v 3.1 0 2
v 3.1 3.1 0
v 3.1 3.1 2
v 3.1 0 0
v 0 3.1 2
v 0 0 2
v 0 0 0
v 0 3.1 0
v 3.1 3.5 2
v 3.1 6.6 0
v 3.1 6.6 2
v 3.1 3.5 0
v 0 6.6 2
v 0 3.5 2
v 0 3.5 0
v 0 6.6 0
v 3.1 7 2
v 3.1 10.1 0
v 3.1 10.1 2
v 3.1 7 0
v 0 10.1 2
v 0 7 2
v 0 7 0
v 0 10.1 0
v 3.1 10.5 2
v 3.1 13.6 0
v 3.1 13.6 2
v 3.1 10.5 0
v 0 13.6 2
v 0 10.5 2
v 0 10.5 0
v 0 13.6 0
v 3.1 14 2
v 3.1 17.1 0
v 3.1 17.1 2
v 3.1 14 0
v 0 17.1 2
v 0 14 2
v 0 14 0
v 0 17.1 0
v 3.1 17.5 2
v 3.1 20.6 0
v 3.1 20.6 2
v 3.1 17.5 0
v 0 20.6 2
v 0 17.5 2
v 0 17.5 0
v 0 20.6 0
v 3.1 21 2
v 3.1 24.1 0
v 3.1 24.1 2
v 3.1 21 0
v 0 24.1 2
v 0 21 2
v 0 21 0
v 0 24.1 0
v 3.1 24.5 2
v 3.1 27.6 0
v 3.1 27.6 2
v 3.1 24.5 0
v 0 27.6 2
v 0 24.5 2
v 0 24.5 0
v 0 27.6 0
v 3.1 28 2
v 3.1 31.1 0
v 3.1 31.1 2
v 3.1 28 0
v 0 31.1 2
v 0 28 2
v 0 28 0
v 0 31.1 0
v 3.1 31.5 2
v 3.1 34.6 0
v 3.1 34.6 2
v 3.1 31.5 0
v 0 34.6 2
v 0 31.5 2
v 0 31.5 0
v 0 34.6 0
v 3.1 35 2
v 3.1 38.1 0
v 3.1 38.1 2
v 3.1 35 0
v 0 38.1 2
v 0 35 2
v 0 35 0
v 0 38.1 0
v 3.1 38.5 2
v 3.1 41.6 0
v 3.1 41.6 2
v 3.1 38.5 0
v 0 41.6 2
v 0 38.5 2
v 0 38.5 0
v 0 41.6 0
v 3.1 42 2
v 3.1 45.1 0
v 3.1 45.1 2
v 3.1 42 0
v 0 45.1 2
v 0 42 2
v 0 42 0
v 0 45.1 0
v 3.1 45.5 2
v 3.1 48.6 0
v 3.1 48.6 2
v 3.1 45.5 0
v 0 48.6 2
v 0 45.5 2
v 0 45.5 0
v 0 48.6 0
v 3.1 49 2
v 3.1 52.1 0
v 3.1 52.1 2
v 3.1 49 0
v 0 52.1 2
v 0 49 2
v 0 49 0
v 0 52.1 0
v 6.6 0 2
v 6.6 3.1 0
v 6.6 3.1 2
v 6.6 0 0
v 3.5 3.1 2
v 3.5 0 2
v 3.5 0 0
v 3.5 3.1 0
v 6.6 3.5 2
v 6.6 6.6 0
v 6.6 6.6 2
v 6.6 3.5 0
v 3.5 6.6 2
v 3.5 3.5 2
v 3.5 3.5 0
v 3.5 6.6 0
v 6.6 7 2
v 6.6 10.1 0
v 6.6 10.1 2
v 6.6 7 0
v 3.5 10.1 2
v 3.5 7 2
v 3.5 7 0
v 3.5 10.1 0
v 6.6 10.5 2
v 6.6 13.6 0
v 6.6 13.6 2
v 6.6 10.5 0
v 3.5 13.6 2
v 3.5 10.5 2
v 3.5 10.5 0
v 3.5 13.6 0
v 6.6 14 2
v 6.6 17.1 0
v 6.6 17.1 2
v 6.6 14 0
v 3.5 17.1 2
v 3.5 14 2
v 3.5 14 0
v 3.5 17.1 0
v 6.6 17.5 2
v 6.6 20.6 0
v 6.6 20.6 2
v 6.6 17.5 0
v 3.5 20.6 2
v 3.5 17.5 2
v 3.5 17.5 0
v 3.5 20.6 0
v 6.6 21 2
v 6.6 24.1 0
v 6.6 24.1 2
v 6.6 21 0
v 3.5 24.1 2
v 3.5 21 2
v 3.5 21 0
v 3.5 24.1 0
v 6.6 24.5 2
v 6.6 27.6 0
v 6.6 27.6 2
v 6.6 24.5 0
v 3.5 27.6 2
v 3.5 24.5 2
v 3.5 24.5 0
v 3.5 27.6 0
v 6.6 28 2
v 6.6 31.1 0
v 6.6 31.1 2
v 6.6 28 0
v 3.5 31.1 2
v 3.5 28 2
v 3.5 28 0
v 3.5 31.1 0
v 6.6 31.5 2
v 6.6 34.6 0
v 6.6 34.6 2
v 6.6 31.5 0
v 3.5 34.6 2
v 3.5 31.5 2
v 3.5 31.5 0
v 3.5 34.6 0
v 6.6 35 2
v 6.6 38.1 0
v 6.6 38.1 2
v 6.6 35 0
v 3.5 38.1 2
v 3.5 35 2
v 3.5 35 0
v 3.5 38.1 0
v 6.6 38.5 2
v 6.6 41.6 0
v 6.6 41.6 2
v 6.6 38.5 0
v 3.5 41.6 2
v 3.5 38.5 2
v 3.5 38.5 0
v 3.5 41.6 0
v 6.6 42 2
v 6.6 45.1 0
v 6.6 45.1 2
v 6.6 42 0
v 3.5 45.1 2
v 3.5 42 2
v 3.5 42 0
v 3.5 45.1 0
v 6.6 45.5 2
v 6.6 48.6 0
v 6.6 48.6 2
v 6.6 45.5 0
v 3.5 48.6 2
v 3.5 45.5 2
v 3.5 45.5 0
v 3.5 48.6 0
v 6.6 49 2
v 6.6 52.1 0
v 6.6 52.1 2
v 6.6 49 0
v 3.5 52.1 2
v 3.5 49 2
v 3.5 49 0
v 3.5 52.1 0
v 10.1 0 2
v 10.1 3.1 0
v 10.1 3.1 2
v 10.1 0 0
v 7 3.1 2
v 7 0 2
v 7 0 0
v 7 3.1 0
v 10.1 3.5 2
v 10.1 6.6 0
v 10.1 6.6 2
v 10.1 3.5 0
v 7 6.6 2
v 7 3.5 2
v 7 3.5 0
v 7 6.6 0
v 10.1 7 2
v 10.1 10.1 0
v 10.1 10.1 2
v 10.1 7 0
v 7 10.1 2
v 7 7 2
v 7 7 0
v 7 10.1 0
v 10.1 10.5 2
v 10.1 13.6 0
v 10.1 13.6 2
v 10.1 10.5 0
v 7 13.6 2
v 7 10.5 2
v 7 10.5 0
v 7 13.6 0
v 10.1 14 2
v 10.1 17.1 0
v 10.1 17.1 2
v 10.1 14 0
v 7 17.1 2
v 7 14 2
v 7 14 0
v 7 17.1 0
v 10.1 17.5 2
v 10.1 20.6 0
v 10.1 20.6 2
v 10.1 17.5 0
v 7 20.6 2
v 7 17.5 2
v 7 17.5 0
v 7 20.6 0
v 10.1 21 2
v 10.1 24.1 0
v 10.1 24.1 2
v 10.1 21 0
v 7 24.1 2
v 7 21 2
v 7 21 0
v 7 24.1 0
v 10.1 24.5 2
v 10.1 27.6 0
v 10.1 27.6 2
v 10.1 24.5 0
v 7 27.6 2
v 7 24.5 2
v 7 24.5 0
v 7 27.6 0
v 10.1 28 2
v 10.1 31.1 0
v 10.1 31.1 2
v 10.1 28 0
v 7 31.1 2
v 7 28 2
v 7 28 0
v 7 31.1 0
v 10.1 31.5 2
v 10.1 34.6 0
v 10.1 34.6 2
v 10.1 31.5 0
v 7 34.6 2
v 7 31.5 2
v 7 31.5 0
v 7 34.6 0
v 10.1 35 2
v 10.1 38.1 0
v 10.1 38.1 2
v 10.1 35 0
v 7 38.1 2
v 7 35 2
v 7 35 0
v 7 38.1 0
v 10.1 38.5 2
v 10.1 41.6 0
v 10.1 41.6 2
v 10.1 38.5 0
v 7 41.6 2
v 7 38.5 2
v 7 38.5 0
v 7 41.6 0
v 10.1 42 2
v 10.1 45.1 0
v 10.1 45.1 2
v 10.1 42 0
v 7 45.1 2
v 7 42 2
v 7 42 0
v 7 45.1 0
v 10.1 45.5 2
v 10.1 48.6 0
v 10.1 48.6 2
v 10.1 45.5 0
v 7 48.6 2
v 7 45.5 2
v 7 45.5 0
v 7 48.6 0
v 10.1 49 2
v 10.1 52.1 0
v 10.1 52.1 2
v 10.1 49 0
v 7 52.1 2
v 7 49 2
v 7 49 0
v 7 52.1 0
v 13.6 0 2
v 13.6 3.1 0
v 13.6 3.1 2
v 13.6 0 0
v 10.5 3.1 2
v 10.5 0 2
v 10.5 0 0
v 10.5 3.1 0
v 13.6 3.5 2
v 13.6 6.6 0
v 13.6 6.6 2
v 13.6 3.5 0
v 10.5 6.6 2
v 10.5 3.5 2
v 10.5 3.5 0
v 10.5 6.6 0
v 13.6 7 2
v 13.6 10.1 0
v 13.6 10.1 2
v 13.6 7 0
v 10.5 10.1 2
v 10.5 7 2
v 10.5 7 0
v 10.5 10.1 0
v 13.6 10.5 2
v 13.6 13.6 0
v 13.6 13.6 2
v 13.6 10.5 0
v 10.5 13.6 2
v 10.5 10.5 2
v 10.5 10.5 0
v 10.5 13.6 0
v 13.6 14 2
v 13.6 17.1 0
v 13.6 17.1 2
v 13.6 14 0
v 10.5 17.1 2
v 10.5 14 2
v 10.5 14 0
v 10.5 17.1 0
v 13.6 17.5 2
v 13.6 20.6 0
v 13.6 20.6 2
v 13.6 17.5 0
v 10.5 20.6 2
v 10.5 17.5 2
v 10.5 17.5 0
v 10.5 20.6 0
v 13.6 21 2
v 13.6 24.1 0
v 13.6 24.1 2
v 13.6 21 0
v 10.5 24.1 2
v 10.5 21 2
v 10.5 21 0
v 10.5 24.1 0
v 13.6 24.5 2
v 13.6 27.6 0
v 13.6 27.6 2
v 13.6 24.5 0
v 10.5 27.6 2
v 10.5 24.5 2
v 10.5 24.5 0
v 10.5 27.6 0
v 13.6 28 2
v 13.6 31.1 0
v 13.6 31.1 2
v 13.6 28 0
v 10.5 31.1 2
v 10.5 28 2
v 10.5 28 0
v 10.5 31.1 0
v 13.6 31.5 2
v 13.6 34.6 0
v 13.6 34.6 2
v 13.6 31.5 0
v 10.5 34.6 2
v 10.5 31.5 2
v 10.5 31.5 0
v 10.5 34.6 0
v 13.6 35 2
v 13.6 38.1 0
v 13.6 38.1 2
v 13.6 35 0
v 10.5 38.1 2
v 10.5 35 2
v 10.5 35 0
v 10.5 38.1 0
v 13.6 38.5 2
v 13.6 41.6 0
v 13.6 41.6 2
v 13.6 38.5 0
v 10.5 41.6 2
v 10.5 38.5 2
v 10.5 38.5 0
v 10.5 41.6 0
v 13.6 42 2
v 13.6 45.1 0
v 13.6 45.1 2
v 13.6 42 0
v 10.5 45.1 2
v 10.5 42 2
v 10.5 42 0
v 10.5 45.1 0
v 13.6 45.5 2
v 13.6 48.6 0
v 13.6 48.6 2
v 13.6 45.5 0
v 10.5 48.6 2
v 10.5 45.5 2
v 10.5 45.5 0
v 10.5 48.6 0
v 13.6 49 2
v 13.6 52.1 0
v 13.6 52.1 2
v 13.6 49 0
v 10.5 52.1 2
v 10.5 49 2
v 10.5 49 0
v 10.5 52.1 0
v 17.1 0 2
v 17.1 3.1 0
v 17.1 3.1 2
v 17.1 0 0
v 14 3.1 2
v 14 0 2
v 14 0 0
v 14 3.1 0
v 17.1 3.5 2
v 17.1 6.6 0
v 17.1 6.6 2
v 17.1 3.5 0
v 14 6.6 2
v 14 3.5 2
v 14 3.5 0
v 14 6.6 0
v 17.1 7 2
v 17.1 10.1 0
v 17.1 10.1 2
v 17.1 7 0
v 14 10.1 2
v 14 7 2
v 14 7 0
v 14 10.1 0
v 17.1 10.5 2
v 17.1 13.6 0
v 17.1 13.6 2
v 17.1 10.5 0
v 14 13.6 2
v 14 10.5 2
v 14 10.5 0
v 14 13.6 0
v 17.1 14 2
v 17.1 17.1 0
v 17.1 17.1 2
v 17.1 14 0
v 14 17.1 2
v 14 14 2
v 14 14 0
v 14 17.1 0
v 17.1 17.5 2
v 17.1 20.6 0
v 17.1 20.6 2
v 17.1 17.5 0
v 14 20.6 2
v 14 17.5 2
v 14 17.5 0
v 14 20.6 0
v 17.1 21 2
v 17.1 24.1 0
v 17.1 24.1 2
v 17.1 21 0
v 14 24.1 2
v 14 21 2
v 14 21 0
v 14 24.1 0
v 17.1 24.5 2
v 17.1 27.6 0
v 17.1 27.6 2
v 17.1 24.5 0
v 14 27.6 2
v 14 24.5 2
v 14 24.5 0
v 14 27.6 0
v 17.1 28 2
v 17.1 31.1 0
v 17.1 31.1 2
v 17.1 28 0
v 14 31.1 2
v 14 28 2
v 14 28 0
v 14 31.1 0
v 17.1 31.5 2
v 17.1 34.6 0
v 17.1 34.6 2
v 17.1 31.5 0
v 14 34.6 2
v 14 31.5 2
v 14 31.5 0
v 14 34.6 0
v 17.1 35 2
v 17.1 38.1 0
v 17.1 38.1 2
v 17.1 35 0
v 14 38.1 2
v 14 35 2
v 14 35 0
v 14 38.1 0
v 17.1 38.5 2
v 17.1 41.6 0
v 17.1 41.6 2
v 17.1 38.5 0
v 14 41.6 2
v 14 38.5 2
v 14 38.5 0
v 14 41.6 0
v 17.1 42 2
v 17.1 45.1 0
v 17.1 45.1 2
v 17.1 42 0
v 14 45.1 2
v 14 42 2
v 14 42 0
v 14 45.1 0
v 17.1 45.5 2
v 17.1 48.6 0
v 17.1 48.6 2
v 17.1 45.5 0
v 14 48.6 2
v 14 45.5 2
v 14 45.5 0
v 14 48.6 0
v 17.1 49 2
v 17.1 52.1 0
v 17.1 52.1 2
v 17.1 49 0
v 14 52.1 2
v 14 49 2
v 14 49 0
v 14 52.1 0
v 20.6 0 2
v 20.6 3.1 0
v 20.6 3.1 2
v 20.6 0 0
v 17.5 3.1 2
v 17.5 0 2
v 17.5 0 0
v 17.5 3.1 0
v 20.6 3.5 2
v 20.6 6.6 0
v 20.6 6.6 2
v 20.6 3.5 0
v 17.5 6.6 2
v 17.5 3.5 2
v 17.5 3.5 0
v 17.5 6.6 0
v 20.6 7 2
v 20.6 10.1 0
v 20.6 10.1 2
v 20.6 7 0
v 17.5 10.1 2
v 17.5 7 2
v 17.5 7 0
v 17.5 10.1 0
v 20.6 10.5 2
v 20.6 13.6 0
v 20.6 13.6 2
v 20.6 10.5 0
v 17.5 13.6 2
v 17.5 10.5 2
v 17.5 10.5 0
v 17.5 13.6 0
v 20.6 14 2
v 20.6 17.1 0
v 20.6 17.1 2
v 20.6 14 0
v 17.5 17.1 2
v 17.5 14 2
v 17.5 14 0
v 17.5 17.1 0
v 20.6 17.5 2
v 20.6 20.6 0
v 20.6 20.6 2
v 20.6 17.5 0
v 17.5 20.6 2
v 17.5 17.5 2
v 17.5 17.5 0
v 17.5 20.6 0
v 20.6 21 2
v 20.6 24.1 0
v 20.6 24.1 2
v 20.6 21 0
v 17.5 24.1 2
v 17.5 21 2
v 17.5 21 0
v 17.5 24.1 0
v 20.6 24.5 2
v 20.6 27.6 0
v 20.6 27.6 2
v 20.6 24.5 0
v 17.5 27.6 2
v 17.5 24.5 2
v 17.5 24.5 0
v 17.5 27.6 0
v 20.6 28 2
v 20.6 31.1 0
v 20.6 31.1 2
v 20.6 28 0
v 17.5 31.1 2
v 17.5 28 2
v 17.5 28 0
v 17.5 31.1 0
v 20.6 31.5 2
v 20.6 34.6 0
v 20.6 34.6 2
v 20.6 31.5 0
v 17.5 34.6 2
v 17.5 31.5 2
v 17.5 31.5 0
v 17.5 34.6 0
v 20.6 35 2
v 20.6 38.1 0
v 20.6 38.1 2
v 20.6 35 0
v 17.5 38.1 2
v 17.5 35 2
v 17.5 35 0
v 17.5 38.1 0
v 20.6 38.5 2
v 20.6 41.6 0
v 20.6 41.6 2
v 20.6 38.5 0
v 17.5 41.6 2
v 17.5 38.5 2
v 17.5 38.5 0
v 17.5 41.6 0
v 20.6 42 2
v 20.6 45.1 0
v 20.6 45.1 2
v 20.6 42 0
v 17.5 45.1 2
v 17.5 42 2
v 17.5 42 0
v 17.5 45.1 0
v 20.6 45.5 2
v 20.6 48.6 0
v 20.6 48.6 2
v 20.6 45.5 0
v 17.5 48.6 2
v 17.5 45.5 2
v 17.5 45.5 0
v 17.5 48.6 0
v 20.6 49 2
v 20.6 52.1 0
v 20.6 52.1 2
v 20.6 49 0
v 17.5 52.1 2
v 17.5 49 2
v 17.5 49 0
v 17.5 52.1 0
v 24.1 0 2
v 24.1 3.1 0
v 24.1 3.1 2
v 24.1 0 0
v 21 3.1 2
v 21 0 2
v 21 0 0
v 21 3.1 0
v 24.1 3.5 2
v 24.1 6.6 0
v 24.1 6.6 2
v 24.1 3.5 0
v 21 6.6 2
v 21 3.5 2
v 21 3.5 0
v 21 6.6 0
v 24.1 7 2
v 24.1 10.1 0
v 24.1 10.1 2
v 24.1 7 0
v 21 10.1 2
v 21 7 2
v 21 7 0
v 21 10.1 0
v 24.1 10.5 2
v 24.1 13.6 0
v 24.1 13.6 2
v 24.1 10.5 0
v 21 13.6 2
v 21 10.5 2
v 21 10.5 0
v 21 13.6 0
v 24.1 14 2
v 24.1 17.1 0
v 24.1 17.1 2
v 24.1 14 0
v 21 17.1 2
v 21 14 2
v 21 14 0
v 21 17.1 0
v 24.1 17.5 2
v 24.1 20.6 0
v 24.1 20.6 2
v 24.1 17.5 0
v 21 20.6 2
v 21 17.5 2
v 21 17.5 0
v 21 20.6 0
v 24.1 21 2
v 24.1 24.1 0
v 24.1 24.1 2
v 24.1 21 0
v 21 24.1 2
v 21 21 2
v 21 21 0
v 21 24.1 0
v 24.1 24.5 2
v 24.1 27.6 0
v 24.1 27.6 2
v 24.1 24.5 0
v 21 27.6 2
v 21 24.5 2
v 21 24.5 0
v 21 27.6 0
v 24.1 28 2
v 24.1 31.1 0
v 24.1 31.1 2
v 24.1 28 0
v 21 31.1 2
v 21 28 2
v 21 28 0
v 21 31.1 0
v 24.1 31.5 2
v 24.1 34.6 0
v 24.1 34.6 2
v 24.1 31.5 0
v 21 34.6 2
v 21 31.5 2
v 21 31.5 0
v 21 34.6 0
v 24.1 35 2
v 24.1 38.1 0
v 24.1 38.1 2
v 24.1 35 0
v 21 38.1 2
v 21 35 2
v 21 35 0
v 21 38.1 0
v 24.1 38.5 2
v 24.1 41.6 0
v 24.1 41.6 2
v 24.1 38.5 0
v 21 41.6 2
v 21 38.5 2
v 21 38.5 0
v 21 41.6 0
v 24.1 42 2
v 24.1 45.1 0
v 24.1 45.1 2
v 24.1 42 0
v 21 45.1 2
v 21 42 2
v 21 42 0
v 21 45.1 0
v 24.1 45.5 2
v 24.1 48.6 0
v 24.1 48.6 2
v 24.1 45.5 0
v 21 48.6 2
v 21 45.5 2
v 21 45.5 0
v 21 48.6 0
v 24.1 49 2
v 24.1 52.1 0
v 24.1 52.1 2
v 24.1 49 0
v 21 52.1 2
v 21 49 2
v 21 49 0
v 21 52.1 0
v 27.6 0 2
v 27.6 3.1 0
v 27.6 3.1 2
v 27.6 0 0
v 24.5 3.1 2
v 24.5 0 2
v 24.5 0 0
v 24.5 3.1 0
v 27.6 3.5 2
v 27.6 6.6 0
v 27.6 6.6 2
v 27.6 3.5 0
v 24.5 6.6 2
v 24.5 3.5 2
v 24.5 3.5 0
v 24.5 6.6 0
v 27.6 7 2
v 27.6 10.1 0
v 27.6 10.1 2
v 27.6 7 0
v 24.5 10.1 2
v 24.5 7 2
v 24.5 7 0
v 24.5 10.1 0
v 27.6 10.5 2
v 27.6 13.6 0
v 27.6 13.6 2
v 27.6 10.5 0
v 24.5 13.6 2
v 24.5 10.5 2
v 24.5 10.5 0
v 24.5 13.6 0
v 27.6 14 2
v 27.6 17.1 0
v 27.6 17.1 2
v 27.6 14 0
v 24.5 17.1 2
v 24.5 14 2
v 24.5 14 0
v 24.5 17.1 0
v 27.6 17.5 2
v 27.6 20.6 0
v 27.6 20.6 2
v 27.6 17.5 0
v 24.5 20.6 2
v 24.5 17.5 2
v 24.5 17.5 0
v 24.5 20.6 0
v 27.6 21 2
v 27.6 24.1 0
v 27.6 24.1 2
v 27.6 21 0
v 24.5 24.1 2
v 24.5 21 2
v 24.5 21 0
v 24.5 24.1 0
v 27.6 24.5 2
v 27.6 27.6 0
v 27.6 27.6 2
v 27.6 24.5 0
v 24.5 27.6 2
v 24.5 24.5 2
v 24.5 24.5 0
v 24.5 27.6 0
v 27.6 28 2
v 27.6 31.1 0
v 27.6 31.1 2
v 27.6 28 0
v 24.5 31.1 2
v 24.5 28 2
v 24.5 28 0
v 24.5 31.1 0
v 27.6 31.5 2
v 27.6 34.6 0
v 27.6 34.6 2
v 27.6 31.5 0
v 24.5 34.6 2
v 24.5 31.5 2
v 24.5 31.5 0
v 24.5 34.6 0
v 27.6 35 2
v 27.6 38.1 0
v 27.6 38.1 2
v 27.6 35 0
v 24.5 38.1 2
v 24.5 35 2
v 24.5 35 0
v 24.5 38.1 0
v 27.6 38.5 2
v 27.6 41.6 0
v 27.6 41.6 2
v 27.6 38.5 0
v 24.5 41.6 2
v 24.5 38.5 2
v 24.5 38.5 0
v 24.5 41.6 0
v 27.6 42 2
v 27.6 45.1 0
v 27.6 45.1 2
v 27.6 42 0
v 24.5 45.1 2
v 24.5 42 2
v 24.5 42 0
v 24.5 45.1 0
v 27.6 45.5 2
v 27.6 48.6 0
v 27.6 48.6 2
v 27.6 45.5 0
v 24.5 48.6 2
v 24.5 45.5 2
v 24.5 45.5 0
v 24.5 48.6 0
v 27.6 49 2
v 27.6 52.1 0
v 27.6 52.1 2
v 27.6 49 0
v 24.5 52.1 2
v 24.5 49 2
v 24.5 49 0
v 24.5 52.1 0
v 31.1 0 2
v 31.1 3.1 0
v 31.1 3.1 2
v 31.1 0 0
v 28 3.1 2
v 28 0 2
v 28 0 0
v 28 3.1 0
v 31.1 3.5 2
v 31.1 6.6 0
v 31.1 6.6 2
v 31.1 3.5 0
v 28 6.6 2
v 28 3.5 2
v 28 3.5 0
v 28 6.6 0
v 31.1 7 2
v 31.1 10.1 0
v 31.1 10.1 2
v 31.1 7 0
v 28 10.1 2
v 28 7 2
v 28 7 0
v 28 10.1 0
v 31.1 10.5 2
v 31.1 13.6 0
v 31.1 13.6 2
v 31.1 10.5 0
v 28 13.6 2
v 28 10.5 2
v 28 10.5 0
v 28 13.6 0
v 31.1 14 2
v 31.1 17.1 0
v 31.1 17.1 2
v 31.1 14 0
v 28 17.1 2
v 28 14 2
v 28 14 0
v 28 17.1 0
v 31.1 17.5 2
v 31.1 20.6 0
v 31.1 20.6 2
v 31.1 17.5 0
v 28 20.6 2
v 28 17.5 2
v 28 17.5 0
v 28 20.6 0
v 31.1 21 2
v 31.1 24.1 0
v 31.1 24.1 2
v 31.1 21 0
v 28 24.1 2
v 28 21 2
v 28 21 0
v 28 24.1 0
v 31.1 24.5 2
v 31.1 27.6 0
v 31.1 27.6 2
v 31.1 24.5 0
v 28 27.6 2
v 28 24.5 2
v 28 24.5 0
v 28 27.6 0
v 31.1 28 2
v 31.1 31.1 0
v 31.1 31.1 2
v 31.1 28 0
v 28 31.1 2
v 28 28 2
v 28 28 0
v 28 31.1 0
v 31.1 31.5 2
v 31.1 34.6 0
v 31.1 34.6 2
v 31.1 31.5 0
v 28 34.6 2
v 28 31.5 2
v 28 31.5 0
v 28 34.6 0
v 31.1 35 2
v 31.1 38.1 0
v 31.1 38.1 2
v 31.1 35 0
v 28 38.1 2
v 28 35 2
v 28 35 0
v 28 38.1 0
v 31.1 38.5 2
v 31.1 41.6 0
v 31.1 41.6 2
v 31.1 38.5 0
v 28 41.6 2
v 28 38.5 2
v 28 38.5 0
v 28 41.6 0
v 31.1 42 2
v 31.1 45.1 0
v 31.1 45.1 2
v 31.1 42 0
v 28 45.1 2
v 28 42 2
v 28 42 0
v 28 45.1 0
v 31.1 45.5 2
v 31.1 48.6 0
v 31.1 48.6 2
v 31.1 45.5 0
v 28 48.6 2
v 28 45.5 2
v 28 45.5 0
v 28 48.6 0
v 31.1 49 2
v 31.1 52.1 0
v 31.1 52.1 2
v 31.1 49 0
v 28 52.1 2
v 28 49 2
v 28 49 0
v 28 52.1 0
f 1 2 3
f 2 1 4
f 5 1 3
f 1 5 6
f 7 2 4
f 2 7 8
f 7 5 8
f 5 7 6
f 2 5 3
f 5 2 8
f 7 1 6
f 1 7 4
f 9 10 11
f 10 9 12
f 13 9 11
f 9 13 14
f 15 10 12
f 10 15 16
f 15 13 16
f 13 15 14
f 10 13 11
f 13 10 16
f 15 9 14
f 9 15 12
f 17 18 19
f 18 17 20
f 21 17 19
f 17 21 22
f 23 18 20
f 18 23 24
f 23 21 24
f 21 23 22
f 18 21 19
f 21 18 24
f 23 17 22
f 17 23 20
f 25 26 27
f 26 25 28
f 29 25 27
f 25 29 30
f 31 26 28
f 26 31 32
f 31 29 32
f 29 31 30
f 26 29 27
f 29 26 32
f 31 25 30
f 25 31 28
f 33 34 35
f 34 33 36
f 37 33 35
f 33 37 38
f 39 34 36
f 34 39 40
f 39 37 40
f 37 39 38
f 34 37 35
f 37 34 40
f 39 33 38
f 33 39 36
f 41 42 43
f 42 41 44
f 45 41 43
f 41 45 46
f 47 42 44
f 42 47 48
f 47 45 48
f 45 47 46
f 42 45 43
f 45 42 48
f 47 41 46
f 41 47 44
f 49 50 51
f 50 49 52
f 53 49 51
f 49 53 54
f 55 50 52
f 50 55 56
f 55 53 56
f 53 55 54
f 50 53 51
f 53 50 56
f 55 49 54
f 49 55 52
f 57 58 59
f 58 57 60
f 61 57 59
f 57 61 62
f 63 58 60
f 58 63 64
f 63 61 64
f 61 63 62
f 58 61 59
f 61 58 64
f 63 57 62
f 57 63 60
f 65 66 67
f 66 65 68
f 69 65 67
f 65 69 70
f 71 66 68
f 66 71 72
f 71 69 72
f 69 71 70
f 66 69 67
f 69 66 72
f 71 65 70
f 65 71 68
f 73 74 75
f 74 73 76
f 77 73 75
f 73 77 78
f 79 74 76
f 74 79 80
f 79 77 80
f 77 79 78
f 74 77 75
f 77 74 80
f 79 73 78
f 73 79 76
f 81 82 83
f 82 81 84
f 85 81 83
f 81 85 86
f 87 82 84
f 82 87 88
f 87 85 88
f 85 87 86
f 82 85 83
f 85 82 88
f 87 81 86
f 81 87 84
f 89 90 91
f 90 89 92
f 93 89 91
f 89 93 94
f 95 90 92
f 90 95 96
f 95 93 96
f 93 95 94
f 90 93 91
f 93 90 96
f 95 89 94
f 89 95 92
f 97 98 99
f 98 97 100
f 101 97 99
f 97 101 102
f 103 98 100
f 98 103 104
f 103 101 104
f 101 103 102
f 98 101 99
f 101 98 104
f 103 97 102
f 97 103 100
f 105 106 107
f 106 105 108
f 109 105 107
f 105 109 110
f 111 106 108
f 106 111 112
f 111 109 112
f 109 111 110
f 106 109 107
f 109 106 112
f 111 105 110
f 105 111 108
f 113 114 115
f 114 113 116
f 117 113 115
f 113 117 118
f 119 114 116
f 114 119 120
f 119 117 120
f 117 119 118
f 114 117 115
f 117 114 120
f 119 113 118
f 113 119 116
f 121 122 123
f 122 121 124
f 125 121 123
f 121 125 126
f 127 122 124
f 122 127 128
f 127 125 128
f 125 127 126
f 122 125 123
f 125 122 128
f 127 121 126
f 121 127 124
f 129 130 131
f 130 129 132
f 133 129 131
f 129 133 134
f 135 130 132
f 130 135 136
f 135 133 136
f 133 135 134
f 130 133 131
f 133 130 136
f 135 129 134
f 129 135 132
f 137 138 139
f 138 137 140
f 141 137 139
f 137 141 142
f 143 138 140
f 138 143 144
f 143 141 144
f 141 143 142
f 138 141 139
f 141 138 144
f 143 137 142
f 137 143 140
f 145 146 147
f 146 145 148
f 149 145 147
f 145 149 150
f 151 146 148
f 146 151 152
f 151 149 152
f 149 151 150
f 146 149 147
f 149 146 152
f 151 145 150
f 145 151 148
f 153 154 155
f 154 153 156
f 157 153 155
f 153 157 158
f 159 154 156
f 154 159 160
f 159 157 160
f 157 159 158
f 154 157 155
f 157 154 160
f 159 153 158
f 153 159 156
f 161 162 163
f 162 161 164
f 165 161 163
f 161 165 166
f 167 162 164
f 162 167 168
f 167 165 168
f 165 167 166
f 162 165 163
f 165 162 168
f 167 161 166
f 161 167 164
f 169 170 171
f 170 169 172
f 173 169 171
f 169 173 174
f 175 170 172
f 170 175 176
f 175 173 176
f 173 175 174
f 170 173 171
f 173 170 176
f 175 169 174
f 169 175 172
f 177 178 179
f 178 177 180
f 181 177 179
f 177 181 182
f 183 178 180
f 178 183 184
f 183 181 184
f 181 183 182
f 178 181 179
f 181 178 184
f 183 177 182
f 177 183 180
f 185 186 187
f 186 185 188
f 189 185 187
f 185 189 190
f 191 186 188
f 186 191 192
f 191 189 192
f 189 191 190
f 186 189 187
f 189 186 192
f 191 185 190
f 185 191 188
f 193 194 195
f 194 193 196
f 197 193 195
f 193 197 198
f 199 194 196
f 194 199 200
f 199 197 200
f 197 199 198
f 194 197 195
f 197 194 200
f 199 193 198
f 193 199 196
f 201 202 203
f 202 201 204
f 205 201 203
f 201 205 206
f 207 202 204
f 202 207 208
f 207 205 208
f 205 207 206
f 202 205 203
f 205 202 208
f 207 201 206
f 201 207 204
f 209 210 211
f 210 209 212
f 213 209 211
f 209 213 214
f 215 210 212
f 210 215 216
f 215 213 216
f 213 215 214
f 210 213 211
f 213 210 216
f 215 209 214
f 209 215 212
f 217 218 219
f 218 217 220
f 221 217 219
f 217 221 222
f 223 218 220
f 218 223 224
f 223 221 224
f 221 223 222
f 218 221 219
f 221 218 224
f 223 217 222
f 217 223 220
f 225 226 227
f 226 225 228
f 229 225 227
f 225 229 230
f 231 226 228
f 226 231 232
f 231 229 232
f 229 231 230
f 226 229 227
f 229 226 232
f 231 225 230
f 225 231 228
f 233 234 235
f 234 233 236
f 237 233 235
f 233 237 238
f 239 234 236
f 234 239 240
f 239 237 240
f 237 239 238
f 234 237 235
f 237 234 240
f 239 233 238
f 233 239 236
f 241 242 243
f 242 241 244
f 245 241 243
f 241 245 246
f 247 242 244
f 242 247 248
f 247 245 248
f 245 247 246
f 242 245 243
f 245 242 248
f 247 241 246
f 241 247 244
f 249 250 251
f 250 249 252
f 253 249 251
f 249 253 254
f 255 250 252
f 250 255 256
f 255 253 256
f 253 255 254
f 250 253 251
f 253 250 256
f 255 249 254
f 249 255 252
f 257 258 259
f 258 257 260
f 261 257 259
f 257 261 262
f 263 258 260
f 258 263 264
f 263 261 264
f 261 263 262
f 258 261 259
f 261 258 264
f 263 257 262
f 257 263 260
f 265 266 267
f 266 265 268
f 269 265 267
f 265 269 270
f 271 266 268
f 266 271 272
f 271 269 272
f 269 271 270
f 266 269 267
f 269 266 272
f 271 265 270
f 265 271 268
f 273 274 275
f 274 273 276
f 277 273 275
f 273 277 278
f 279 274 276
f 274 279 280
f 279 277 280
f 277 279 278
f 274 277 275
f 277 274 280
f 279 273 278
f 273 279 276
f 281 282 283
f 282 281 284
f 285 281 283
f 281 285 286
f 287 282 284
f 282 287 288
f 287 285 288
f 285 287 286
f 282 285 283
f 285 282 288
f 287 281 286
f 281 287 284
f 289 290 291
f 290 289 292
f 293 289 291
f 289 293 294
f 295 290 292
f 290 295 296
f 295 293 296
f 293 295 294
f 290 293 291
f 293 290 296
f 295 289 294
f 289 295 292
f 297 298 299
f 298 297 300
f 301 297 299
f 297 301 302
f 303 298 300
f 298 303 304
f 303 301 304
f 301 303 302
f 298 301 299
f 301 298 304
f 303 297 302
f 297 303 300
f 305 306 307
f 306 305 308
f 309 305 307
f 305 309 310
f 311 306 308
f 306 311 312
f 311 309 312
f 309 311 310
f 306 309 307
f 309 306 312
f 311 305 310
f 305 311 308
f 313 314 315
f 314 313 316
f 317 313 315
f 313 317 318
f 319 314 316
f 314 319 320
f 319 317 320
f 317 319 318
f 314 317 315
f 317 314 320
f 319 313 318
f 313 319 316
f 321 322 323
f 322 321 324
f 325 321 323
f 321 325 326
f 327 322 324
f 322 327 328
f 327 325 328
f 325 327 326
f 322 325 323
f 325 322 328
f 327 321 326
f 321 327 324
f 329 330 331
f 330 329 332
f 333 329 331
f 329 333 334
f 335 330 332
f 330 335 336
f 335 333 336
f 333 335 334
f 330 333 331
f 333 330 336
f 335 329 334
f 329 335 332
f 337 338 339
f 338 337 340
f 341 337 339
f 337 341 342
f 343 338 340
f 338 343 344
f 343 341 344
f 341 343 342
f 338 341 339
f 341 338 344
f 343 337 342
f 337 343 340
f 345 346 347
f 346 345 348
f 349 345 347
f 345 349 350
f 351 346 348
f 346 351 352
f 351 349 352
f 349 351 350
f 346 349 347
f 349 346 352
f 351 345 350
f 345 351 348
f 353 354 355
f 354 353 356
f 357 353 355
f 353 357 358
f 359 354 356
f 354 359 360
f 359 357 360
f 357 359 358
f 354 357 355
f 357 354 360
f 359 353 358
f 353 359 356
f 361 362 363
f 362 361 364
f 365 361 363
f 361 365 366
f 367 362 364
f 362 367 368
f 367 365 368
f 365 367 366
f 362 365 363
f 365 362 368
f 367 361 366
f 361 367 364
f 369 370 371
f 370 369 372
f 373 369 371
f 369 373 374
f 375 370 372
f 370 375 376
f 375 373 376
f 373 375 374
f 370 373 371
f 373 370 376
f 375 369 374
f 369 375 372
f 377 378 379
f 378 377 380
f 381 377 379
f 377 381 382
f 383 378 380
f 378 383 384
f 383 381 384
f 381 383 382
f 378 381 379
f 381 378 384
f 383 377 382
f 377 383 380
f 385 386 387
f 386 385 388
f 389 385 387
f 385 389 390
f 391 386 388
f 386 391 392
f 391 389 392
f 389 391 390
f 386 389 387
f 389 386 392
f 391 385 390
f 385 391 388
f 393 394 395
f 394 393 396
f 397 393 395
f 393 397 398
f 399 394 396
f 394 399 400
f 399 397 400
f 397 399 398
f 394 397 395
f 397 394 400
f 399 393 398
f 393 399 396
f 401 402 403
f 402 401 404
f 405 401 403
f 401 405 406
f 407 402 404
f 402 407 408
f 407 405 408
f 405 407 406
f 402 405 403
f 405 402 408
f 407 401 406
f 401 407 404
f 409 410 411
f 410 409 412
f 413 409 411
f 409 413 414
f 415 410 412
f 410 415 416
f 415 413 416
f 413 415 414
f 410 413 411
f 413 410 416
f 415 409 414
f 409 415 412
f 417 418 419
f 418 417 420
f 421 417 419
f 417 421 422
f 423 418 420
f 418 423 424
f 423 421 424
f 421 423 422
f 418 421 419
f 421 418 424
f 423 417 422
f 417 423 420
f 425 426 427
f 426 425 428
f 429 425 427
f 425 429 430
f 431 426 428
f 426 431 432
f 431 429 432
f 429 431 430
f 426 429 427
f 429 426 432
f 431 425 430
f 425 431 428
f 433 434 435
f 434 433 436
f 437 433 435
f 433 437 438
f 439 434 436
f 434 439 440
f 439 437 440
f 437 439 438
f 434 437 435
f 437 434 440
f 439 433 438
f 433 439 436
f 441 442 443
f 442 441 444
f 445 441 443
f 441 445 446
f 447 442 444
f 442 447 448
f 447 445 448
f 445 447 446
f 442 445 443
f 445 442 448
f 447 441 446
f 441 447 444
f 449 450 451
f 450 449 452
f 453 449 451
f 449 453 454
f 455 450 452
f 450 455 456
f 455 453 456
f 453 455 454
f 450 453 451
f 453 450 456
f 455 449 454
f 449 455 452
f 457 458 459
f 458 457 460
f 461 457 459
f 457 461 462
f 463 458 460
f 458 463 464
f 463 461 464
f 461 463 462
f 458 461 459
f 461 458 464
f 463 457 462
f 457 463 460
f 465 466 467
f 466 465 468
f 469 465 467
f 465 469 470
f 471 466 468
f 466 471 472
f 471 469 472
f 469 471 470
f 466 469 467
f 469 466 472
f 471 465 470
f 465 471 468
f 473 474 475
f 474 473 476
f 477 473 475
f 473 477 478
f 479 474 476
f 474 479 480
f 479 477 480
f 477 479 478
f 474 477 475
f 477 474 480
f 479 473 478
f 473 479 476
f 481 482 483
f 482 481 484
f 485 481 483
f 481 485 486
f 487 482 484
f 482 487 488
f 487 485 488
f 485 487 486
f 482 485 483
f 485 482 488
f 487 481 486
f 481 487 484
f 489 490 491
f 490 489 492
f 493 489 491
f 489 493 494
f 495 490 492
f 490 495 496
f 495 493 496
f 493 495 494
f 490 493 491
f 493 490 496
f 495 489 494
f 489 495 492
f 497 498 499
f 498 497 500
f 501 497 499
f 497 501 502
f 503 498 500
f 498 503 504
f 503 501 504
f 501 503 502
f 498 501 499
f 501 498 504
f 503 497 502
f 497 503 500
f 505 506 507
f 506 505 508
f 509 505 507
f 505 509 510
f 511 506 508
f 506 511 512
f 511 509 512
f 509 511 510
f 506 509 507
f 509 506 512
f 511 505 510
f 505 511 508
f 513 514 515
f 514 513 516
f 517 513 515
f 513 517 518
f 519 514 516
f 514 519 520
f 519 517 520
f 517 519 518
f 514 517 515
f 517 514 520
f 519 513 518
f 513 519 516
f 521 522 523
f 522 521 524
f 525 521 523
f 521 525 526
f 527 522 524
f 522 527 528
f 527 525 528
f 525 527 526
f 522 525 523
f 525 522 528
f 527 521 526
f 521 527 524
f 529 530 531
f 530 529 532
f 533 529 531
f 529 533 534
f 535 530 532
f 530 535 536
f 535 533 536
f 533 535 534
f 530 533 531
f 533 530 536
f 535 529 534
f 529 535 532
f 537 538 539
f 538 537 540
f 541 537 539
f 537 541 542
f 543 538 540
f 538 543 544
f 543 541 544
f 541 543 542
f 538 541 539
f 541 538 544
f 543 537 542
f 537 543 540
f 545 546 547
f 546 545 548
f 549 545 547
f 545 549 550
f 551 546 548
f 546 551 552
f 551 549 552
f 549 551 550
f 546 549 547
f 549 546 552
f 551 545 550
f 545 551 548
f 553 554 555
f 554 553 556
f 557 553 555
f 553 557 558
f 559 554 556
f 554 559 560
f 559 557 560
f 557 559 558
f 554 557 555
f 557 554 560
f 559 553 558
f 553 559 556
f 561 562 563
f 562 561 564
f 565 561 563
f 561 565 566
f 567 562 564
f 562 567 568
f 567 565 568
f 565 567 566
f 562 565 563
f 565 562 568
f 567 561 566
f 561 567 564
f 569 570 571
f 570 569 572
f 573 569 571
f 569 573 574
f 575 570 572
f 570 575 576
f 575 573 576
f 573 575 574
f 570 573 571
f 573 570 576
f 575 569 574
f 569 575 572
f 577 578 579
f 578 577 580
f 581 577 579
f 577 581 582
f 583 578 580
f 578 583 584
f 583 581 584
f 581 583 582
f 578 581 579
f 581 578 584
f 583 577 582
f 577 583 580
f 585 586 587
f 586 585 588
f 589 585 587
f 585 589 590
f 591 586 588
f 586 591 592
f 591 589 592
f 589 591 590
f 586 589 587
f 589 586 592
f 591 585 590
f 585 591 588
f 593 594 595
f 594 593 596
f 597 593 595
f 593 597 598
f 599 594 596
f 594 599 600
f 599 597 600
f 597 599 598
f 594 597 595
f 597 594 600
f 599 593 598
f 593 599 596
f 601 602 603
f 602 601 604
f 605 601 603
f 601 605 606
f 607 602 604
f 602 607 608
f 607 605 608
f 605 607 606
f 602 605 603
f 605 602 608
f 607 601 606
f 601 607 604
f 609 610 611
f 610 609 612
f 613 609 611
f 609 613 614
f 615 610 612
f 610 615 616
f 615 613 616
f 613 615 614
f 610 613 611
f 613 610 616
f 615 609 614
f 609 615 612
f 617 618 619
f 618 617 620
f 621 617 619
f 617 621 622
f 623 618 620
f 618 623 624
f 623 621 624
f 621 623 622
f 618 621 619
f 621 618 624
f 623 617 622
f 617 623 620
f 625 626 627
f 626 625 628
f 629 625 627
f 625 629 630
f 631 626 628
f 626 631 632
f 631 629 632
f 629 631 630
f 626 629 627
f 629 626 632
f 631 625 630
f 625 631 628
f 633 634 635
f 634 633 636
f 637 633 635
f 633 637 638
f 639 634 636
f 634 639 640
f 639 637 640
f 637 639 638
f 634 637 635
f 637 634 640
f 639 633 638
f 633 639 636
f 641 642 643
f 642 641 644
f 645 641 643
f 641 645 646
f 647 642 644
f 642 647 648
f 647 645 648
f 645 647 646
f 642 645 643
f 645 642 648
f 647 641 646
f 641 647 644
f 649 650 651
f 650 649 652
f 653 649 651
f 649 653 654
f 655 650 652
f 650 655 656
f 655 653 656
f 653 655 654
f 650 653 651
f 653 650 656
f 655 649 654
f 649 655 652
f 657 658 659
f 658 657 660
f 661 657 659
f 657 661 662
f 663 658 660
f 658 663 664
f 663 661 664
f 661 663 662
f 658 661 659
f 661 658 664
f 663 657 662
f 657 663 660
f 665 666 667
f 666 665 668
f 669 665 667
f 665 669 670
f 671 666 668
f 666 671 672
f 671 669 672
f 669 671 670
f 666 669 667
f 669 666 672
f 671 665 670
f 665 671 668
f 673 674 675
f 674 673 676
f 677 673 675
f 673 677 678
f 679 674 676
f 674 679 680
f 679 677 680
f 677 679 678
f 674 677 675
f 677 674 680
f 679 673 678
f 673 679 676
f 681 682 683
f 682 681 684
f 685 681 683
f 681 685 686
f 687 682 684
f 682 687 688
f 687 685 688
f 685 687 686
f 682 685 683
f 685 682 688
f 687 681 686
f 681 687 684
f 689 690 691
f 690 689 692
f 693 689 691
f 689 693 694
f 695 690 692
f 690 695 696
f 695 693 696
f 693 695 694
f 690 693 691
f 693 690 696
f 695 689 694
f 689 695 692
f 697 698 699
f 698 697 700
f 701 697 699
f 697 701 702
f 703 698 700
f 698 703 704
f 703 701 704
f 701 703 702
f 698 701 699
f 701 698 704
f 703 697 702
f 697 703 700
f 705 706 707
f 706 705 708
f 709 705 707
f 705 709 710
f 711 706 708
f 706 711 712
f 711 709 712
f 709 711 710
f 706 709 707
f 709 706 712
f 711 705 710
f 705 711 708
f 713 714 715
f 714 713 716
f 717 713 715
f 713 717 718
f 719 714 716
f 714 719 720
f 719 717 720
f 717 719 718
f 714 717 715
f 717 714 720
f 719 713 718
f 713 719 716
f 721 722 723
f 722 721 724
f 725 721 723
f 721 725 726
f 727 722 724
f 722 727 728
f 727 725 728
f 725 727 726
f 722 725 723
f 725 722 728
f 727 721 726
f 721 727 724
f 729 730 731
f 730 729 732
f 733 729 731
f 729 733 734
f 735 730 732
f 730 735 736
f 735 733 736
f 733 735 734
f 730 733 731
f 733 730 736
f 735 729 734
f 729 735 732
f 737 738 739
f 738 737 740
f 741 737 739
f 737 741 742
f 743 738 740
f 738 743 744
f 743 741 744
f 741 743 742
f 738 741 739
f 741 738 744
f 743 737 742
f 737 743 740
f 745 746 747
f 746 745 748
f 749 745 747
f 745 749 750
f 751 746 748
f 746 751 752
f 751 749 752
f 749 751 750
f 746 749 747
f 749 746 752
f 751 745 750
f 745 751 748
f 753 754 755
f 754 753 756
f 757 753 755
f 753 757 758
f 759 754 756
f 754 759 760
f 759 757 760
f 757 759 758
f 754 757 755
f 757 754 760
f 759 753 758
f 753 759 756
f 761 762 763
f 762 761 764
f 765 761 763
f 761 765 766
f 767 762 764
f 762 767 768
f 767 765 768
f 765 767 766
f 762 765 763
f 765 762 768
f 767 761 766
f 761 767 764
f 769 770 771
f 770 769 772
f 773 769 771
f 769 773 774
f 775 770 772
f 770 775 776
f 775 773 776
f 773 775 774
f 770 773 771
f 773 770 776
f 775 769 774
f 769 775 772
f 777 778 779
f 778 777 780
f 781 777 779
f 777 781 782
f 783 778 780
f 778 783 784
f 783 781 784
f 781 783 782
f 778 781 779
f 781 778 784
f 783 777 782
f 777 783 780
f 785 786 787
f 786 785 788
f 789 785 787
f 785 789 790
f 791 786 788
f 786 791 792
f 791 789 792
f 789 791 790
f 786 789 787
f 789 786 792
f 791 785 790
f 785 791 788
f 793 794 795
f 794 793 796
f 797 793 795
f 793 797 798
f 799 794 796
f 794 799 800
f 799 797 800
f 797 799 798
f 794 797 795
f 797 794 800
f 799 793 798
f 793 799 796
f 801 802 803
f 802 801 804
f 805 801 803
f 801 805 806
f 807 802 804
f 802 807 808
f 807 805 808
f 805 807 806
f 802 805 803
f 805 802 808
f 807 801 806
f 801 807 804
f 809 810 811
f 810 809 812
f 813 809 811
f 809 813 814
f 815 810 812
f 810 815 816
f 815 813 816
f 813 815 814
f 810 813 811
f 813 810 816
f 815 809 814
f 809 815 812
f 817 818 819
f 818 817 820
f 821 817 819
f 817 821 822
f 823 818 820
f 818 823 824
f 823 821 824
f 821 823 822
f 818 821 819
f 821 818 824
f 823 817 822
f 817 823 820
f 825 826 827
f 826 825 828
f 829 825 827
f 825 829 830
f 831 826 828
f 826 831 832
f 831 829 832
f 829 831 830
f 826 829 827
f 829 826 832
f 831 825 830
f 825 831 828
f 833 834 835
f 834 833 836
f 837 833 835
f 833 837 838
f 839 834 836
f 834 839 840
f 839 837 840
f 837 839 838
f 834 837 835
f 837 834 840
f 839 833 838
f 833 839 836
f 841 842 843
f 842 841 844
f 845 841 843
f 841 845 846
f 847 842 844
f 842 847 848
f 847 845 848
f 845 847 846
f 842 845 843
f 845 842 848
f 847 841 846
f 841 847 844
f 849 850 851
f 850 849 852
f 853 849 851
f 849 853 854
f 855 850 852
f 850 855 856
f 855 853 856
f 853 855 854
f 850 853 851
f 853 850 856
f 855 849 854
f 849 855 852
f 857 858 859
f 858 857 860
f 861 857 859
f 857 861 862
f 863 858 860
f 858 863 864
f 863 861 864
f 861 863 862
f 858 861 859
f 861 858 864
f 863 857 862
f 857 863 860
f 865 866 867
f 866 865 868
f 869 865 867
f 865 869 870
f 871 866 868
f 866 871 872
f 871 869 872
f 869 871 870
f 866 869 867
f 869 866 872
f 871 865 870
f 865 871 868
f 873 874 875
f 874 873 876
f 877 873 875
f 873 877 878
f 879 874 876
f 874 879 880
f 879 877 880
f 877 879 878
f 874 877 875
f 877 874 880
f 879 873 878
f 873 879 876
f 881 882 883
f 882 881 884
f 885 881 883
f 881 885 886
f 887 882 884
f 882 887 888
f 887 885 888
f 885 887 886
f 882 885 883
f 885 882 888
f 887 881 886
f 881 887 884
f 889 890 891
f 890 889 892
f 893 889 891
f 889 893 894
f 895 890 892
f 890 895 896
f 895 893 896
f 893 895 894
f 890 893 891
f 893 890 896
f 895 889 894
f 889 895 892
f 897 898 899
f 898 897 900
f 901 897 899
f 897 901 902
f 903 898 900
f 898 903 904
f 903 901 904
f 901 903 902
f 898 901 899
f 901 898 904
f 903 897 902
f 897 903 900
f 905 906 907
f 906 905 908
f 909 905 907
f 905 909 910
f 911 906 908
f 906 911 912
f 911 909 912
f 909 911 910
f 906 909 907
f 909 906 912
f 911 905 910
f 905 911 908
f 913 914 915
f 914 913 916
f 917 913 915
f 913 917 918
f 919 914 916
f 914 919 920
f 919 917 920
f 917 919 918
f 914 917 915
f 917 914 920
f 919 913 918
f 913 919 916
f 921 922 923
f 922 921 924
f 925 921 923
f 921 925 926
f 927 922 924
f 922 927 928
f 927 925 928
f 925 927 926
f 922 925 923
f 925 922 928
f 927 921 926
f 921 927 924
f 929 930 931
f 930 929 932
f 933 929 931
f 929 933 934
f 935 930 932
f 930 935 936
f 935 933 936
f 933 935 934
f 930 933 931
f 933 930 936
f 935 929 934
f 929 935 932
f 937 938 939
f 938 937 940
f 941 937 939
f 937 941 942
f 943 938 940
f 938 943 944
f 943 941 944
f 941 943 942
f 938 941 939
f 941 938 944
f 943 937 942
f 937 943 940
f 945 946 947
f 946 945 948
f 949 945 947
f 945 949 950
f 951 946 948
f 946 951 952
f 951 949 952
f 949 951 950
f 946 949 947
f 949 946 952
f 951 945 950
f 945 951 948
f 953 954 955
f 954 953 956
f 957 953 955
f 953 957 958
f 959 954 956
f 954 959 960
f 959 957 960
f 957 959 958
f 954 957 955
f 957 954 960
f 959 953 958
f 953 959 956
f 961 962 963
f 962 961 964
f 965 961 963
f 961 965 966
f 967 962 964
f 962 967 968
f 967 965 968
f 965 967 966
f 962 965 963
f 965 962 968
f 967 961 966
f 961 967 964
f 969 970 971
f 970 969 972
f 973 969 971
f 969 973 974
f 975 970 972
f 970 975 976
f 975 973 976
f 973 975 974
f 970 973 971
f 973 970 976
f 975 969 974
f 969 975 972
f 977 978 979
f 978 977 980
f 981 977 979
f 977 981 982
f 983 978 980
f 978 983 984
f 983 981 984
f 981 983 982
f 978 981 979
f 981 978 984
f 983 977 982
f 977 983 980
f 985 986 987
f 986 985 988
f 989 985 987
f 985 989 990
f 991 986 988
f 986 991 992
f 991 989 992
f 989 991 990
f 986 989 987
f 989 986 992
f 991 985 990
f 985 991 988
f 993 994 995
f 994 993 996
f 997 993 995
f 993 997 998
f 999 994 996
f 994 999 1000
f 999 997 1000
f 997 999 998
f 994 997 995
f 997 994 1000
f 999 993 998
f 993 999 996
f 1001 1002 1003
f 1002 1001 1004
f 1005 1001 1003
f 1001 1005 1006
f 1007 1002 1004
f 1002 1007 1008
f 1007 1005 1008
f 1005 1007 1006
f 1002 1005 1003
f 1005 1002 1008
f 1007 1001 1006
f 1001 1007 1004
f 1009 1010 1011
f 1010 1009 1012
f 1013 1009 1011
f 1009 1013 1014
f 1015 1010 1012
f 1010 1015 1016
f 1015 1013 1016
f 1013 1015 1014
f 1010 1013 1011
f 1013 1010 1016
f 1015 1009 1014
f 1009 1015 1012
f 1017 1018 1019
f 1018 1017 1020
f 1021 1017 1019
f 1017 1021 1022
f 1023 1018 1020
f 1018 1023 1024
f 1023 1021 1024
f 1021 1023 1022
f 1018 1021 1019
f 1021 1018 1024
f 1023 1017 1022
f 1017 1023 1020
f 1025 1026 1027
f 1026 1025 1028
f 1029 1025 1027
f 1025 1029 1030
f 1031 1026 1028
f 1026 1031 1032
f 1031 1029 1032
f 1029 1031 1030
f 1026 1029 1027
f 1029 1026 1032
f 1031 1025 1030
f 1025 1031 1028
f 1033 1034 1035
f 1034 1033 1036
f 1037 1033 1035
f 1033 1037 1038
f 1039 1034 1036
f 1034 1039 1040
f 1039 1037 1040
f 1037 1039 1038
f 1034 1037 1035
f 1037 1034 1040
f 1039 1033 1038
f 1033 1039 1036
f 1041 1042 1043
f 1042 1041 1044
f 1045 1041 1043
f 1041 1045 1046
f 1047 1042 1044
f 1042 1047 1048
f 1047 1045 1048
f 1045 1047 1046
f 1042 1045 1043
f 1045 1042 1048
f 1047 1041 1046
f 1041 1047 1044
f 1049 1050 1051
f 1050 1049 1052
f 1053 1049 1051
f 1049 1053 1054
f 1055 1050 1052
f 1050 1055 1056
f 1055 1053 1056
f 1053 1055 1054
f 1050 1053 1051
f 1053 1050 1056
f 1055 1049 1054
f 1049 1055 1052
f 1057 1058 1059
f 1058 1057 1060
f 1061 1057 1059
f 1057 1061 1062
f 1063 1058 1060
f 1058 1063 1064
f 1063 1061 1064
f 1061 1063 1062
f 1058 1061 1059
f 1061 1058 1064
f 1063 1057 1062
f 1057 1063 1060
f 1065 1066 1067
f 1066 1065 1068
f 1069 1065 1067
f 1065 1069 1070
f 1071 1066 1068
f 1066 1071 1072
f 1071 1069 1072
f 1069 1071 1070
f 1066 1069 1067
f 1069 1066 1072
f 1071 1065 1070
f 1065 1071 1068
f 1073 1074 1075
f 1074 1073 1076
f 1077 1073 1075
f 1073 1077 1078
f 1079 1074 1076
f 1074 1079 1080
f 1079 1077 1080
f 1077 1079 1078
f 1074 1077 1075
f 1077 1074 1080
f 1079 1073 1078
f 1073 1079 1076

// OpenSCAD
for( i = [0:8]){
	for(j = [0:14]){
		translate([i*3.5,j*3.5,0])
		cube([3.1,3.1,2]);
	}
}
